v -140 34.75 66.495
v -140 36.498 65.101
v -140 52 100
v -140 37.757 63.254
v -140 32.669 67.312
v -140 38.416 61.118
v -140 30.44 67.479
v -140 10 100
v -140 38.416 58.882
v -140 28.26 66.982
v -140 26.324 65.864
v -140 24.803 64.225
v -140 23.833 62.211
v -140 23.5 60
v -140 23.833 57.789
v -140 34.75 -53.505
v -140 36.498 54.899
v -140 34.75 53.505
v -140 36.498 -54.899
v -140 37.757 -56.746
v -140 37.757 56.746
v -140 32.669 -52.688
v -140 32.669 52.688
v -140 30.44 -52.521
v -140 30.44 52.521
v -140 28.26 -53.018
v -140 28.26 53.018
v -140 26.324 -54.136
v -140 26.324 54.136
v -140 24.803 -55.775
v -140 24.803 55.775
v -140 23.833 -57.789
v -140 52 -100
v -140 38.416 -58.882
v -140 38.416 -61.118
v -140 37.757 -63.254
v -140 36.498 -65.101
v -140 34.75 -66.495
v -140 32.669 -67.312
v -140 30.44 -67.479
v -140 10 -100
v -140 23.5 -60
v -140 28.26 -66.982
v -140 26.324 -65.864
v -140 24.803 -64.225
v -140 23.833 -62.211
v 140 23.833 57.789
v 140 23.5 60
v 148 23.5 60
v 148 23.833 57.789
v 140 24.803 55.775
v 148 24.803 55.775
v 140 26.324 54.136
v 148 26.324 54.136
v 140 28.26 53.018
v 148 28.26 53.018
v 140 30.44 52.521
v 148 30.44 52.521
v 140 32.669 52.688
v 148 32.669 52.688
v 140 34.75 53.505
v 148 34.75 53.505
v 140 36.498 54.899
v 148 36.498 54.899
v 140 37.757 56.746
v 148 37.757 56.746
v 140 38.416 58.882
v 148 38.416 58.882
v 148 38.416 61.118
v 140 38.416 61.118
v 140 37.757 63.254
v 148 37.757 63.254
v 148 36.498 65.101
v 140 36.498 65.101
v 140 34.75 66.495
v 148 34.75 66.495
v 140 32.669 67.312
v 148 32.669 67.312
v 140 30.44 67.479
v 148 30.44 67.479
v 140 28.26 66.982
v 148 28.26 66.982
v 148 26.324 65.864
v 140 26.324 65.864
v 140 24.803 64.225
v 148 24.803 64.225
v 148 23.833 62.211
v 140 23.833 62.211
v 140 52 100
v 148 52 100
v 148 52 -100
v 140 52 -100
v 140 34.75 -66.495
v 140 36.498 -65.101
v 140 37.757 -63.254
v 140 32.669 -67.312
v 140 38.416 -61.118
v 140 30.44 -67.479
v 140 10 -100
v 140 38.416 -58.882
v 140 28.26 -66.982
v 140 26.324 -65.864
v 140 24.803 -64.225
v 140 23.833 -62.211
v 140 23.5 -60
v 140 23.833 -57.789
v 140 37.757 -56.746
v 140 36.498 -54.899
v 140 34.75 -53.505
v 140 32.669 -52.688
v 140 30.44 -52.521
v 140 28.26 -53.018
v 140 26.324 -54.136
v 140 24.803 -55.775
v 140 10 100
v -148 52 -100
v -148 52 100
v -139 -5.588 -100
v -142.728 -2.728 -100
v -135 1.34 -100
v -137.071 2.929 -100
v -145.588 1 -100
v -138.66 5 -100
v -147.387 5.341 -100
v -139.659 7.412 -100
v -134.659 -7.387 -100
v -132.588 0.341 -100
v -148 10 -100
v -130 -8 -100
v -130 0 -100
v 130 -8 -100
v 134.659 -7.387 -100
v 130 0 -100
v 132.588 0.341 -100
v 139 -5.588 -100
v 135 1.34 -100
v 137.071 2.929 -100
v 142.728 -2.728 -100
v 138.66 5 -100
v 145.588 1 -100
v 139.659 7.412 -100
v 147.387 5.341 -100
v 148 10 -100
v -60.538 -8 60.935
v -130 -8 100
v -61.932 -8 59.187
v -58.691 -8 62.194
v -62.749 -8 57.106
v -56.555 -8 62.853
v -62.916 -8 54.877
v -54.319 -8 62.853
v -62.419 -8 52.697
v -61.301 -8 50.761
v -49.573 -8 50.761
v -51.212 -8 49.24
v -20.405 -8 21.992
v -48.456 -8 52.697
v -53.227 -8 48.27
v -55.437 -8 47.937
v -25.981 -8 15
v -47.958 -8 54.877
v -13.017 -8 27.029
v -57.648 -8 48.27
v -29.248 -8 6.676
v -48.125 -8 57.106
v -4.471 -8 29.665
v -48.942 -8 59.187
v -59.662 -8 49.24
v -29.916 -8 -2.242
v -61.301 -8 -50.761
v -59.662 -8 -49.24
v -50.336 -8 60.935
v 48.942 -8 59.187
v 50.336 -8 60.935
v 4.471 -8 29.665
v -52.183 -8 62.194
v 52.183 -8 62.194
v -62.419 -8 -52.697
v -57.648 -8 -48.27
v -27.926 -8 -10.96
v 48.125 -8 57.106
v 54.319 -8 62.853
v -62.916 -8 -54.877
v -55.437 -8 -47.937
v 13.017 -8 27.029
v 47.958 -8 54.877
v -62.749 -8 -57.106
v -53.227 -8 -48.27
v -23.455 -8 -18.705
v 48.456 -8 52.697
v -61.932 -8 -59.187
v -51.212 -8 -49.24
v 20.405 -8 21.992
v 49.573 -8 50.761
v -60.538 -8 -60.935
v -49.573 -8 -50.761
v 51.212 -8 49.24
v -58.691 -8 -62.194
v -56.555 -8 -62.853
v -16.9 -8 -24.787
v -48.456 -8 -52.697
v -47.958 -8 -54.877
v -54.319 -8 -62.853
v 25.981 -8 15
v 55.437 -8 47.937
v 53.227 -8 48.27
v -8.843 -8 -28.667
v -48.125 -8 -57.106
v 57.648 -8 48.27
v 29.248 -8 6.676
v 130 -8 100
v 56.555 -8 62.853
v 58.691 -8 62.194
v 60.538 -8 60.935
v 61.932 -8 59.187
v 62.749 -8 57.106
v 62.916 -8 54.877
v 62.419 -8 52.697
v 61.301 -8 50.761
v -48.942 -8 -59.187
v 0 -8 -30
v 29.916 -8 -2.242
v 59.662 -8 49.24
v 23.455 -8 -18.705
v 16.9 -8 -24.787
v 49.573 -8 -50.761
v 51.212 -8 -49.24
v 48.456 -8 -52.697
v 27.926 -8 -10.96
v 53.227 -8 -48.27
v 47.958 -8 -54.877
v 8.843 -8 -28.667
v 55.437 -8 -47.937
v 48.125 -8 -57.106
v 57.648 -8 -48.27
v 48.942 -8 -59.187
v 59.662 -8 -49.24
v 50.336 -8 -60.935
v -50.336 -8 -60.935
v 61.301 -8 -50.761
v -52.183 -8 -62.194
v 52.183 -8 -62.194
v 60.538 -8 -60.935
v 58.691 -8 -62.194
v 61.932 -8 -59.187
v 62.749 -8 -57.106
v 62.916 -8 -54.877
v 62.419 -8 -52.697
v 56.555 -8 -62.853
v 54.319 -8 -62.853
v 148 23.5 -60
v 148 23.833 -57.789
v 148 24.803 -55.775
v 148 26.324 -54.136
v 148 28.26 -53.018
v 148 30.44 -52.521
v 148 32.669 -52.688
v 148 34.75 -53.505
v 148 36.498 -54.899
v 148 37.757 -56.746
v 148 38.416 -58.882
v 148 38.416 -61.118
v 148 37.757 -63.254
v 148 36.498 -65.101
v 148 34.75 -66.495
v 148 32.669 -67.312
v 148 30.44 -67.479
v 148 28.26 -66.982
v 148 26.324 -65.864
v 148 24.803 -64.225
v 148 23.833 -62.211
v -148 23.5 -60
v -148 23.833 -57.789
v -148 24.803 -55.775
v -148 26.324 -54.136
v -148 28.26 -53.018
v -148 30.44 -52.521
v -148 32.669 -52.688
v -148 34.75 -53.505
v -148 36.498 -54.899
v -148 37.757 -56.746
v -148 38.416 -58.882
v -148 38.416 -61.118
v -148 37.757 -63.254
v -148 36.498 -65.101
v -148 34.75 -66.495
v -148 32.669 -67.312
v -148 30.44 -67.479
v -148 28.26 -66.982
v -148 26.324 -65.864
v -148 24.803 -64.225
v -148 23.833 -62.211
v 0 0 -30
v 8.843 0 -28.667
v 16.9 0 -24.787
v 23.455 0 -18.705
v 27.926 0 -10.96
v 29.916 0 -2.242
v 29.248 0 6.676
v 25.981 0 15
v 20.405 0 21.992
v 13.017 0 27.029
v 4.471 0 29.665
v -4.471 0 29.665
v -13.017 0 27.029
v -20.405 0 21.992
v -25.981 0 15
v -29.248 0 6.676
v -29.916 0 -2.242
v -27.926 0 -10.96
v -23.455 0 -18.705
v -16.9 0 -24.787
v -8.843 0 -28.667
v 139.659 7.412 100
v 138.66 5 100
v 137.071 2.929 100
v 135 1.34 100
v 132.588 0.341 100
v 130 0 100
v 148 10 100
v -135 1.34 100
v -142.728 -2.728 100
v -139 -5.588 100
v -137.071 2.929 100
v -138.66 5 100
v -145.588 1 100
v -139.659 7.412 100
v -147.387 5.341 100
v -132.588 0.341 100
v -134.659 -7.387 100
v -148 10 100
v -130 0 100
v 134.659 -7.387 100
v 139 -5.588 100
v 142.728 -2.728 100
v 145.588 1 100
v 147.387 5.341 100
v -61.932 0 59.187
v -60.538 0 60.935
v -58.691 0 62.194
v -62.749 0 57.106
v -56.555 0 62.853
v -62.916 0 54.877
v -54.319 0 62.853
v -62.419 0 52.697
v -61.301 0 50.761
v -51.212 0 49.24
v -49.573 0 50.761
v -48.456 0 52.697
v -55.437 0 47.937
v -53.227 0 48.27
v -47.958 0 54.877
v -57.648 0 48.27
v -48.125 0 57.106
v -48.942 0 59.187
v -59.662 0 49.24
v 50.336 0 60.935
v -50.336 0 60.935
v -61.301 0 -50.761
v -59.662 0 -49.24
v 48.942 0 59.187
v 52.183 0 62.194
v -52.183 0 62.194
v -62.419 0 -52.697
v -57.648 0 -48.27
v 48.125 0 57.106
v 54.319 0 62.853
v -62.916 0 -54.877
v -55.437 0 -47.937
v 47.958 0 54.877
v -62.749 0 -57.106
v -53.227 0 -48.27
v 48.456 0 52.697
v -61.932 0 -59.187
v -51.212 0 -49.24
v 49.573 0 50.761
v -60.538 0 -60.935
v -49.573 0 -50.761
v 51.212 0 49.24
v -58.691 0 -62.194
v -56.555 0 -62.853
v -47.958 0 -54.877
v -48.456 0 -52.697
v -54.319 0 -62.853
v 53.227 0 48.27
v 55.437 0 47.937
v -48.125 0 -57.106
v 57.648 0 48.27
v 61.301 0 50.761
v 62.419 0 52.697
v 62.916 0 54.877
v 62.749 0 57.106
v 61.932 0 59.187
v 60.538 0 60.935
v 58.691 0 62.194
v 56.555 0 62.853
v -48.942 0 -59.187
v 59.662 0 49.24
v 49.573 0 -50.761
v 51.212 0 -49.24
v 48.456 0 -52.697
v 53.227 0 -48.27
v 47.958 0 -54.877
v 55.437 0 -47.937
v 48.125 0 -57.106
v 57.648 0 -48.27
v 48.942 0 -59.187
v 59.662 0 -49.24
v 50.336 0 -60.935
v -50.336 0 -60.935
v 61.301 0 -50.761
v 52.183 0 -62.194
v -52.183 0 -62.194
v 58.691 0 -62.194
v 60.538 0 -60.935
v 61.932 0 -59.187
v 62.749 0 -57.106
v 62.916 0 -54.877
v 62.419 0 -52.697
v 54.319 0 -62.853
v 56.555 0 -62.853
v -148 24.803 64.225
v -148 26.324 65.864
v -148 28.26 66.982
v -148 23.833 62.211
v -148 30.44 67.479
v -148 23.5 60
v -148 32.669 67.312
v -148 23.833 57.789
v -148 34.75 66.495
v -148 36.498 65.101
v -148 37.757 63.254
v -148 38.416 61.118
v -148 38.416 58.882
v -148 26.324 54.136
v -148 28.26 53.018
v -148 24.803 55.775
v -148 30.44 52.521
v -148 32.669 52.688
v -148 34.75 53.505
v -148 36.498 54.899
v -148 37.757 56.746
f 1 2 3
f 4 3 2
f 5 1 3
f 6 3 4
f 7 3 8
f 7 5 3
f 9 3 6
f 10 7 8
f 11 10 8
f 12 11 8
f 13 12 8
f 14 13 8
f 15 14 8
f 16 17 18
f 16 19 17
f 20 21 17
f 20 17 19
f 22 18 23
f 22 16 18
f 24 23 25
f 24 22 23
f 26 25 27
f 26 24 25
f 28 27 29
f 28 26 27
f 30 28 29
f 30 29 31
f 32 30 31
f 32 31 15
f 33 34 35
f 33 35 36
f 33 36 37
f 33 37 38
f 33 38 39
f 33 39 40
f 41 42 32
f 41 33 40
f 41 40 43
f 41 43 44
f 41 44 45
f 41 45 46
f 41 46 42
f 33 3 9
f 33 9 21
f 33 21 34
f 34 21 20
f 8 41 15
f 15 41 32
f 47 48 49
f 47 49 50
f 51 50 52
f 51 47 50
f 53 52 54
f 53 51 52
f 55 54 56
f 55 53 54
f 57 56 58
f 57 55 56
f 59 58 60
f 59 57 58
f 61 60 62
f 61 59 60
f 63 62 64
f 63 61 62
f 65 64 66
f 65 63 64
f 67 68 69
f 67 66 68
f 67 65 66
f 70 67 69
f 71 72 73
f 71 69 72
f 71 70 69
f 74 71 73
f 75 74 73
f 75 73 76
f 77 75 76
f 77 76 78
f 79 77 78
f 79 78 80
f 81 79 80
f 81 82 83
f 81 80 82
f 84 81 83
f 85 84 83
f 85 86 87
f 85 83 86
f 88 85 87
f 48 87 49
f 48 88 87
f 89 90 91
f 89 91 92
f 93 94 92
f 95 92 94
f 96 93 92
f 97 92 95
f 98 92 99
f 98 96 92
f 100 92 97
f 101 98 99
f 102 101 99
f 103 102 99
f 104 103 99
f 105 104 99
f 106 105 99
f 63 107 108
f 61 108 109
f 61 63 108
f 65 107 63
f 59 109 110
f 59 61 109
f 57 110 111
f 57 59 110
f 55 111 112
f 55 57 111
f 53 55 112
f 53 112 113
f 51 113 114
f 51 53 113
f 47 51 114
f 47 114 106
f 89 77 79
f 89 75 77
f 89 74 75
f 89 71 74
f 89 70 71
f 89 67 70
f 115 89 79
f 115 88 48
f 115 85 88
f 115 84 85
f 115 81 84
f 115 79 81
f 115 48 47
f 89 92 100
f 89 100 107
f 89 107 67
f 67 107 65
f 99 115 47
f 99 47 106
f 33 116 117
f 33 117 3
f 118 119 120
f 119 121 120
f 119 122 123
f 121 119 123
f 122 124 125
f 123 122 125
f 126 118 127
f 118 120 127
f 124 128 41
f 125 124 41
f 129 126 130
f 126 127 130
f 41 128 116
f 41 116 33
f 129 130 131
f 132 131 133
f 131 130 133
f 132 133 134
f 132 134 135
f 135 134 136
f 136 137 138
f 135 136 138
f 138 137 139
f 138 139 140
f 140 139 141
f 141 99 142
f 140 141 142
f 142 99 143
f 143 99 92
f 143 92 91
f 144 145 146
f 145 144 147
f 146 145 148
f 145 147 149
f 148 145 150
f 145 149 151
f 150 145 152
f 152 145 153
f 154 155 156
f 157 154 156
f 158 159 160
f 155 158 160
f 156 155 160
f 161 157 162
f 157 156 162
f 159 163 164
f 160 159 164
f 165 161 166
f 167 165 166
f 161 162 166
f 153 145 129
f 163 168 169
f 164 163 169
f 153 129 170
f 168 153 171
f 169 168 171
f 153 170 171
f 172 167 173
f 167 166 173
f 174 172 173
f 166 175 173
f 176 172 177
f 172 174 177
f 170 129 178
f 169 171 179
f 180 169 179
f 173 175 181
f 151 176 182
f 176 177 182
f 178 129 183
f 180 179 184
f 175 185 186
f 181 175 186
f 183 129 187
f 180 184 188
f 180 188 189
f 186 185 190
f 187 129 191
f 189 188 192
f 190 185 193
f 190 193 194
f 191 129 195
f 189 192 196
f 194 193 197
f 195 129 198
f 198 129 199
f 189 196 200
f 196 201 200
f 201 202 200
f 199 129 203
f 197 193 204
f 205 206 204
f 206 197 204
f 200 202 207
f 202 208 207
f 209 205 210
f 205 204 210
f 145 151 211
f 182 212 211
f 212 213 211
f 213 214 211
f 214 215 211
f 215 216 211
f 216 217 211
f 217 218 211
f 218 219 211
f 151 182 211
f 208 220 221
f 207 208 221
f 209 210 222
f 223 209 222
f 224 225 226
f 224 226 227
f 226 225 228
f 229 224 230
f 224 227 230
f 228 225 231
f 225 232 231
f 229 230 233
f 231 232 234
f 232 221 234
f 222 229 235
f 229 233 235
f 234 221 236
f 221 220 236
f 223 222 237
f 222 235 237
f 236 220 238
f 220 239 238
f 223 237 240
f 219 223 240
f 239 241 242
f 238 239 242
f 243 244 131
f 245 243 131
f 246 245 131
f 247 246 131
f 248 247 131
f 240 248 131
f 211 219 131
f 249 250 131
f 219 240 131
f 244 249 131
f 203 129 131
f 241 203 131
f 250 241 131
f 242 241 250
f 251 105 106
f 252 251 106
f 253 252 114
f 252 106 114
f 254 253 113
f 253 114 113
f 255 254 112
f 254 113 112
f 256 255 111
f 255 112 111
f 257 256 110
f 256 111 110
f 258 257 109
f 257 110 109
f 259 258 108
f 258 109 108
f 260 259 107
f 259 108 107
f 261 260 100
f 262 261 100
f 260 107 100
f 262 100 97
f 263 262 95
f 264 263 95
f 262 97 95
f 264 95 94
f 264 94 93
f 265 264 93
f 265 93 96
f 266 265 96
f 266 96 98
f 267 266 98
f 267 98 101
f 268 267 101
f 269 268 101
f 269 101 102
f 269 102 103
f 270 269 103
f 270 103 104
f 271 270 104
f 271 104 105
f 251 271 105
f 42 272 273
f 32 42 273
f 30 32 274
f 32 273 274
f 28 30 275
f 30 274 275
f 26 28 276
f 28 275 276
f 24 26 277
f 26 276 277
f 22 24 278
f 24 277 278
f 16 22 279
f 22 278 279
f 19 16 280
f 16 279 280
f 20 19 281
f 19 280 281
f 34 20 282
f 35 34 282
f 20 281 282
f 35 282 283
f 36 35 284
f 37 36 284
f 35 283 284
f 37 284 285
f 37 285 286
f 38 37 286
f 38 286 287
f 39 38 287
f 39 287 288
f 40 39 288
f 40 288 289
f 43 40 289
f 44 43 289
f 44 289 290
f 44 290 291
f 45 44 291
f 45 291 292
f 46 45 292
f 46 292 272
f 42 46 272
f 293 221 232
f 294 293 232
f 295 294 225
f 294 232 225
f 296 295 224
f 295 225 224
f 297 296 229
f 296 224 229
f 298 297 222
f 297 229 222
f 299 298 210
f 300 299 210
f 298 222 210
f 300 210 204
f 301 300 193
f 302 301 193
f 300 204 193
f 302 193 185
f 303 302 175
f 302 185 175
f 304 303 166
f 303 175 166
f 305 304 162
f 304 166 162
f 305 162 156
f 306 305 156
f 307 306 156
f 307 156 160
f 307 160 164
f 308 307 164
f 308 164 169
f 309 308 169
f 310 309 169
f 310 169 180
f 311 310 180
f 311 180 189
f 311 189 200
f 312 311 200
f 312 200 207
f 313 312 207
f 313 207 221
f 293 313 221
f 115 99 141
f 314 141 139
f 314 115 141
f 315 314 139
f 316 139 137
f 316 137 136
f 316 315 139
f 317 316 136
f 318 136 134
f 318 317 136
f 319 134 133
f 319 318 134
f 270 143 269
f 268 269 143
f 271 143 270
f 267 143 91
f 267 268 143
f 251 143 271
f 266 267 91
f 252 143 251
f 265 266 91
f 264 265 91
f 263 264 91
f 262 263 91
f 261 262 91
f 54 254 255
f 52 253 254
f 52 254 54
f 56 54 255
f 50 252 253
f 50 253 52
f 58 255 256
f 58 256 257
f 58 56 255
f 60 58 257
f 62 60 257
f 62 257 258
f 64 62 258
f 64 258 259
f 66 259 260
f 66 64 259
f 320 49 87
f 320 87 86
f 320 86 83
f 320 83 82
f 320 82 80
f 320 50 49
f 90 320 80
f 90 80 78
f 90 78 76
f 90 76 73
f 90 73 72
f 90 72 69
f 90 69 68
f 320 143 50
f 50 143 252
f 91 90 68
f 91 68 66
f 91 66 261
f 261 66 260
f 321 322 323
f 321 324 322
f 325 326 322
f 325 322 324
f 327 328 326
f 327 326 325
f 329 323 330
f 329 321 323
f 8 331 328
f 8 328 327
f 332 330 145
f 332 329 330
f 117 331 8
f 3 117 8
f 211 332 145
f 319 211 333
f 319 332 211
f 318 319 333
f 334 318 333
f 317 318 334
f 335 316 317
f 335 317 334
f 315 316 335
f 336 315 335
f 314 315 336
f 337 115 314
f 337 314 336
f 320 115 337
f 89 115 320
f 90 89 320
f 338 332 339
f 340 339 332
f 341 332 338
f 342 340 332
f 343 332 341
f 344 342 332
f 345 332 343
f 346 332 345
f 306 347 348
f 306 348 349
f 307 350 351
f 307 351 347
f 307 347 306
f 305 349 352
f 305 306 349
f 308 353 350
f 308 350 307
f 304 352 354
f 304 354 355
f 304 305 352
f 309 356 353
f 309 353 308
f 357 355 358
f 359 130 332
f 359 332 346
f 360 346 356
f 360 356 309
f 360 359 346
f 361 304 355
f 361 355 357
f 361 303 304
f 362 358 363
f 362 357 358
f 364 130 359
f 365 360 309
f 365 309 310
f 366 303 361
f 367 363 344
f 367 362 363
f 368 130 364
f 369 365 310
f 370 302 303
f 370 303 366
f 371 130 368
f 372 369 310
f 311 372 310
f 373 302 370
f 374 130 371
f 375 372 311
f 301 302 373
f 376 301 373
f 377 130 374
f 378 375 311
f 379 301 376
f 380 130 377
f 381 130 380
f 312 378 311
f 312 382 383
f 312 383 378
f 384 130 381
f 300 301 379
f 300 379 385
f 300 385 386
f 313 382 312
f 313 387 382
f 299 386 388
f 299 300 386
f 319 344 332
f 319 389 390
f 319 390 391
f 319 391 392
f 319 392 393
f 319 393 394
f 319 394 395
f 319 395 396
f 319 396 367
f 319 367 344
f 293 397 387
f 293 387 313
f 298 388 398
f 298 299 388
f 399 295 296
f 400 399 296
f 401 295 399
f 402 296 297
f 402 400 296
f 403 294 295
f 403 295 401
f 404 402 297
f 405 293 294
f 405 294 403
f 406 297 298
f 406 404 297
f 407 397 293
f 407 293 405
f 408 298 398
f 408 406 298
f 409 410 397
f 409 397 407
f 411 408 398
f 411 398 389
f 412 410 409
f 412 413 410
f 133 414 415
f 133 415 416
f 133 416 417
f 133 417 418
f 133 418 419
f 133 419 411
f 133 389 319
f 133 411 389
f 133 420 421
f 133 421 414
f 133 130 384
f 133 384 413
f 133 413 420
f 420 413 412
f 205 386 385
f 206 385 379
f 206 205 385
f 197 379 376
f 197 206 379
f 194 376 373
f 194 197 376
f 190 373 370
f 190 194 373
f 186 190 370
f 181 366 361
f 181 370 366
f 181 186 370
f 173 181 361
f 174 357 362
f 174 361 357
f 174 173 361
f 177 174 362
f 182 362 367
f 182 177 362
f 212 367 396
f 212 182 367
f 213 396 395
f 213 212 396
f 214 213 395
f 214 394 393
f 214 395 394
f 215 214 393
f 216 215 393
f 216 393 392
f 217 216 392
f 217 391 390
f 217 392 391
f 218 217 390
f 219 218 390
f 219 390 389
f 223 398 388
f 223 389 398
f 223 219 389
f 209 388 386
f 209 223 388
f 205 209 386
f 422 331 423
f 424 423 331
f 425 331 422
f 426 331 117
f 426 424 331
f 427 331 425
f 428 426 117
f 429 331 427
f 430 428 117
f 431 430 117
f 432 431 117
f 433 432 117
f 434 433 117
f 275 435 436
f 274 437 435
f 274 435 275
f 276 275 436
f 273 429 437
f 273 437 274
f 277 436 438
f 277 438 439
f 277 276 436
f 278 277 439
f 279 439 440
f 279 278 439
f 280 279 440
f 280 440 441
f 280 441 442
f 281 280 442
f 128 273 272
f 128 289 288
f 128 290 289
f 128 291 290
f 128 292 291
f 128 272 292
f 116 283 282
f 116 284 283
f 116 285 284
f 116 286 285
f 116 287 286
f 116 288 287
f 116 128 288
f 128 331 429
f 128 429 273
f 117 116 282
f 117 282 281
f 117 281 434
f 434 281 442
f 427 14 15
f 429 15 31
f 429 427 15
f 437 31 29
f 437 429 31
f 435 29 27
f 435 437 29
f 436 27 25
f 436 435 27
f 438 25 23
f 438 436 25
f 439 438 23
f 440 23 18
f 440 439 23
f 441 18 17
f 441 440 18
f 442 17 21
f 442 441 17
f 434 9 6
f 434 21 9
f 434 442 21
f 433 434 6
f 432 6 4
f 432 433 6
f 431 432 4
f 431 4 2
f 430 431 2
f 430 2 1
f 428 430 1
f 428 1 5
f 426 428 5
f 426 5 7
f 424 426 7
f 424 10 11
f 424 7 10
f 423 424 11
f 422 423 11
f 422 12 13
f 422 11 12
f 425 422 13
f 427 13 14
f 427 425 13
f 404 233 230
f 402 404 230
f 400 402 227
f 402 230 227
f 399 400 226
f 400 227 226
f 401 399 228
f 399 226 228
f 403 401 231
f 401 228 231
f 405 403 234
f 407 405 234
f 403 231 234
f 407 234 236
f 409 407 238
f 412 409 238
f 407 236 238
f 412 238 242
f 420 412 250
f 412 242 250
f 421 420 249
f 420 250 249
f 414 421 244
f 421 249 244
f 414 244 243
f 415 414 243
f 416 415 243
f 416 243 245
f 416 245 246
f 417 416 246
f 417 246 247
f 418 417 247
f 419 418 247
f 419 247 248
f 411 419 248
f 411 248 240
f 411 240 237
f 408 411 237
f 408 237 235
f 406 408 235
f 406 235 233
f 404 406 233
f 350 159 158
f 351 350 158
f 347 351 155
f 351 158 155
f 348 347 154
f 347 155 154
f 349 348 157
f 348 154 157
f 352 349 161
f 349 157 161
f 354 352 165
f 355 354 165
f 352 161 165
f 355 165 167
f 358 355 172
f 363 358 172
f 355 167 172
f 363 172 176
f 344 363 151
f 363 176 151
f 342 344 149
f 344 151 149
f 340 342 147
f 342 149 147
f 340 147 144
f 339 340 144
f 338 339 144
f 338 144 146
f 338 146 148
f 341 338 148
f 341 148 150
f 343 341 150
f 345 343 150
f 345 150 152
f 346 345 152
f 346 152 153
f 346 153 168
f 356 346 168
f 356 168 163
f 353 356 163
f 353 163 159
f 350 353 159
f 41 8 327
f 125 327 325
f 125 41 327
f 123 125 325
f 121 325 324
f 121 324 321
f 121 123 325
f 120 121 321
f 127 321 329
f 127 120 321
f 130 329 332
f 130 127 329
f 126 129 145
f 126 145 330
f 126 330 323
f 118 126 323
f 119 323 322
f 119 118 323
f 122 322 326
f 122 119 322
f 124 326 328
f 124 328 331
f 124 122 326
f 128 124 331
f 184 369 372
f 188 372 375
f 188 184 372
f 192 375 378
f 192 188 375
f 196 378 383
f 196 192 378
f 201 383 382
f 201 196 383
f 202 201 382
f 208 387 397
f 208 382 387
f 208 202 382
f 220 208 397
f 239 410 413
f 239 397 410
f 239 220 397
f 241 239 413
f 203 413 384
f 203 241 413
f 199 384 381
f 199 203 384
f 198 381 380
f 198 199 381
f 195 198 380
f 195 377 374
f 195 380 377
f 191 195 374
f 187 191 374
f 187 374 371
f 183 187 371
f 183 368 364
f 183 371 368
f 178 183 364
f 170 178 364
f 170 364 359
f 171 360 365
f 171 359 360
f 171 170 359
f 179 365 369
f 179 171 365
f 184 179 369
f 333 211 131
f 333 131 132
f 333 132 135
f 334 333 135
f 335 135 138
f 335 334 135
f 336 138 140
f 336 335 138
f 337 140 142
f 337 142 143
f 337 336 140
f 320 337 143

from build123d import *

# Parameters (mm, degrees)
SKETCH1_W                      = 296
SKETCH1_H                      = 200
BASE_FLANGE1_DEPTH             = 8
EDGE_FLANGE1_STRIP_W           = 52
EDGE_FLANGE1_STRIP_H           = 8
EDGE_FLANGE1_STRIP_CUT_DEPTH   = 200
EDGE_FLANGE1_STRIP_2_W         = 52
EDGE_FLANGE1_STRIP_2_H         = 8
EDGE_FLANGE1_STRIP_CUT_2_DEPTH = 200
EDGE_FLANGE1_DEPTH             = 200
EDGE_FLANGE1_BEND_DEPTH        = 200
SKETCH12_R                     = 30
CUT_EXTRUDE1_DEPTH             = 10
SKETCH13_R                     = 7.5
CUT_EXTRUDE2_DEPTH             = 10
SKETCH15_R                     = 7.5
CUT_EXTRUDE3_DEPTH             = 317.733326317
MIRROR5_COPY_1_SKETCH_R        = 7.5
MIRROR5_COPY_1_DEPTH           = 10


# Sheet-metal steps are written as plain solids
with BuildPart() as part:
    # Sketch1 → Base-Flange1 (new body)
    with BuildSketch(Plane(origin=(0, 0, 0), x_dir=(1, 0, 0), z_dir=(0, 1, 0))):
        Rectangle(SKETCH1_W, SKETCH1_H)
    extrude(amount=-BASE_FLANGE1_DEPTH)

    # Edge-Flange1 strip (across the edge) → Edge-Flange1 strip cut (cut)
    with BuildSketch(Plane(origin=(-148, 0, -100), x_dir=(1, 0, 0), z_dir=(0, 0, 1))):
        with Locations((-8, -4)):
            Rectangle(EDGE_FLANGE1_STRIP_W, EDGE_FLANGE1_STRIP_H)
    extrude(amount=EDGE_FLANGE1_STRIP_CUT_DEPTH, mode=Mode.SUBTRACT)

    # Edge-Flange1 strip 2 (across the edge) → Edge-Flange1 strip cut 2 (cut)
    with BuildSketch(Plane(origin=(148, 0, 100), x_dir=(-1, 0, 0), z_dir=(0, 0, -1))):
        with Locations((-8, -4)):
            Rectangle(EDGE_FLANGE1_STRIP_2_W, EDGE_FLANGE1_STRIP_2_H)
    extrude(amount=EDGE_FLANGE1_STRIP_CUT_2_DEPTH, mode=Mode.SUBTRACT)

    # Edge-Flange1 section (across the edge) → Edge-Flange1 (add)
    with BuildSketch(Plane(origin=(-148, 0, -100), x_dir=(1, 0, 0), z_dir=(0, 0, 1))):
        with BuildLine():
            Line((0, 10), (0, 52))
            Line((0, 52), (8, 52))
            Line((8, 52), (8, 10))
            ThreePointArc((8, 10), (10.928932188, 2.928932188), (18, 0))
            Line((18, 0), (18, -8))
            ThreePointArc((18, -8), (5.272077939, -2.727922061), (0, 10))
        make_face()
    extrude(amount=EDGE_FLANGE1_DEPTH)

    # Edge-Flange1 section 2 (across the edge) → Edge-Flange1 bend (add)
    with BuildSketch(Plane(origin=(148, 0, 100), x_dir=(-1, 0, 0), z_dir=(0, 0, -1))):
        with BuildLine():
            Line((0, 10), (0, 52))
            Line((0, 52), (8, 52))
            Line((8, 52), (8, 10))
            ThreePointArc((8, 10), (10.928932188, 2.928932188), (18, 0))
            Line((18, 0), (18, -8))
            ThreePointArc((18, -8), (5.272077939, -2.727922061), (0, 10))
        make_face()
    extrude(amount=EDGE_FLANGE1_BEND_DEPTH)

    # Sketch12 → Cut-Extrude1 (cut)
    with BuildSketch(Plane(origin=(0, -8, 0), x_dir=(-1, 0, 0), z_dir=(0, -1, 0))):
        with Locations(Location((0, 0, 0), (0, 0, 90))):
            Circle(SKETCH12_R)
    extrude(amount=-CUT_EXTRUDE1_DEPTH, mode=Mode.SUBTRACT)

    # Sketch13 → Cut-Extrude2 (cut)
    with BuildSketch(Plane(origin=(0, -8, 0), x_dir=(-1, 0, 0), z_dir=(0, -1, 0))):
        with Locations(Location((55.437171645, -55.437171645, 0), (0, 0, 90))):
            Circle(SKETCH13_R)
    cut_extrude2 = extrude(amount=-CUT_EXTRUDE2_DEPTH, mode=Mode.SUBTRACT)

    # Mirror4: Cut-Extrude2 across plane
    add(cut_extrude2.mirror(Plane(origin=(0, 0, 0), x_dir=(0, 0, 1), z_dir=(1, 0, 0))), mode=Mode.SUBTRACT)

    # Sketch15 → Cut-Extrude3 (cut, through all)
    with BuildSketch(Plane.ZY.offset(148)):
        with Locations(Location((-60, 31, 0), (0, 0, 270))):
            Circle(SKETCH15_R)
    cut_extrude3 = extrude(amount=-CUT_EXTRUDE3_DEPTH, mode=Mode.SUBTRACT)

    # Mirror5: Cut-Extrude2, Cut-Extrude3 across plane
    add(cut_extrude2.mirror(Plane.XY), mode=Mode.SUBTRACT)
    add(cut_extrude3.mirror(Plane.XY), mode=Mode.SUBTRACT)

    # Mirror5 copy 1 sketch → Mirror5 copy 1 (cut)
    with BuildSketch(Plane.XZ.offset(8)):
        with Locations(Location((55.437171645, -55.437171645, 0), (0, 0, 90))):
            Circle(MIRROR5_COPY_1_SKETCH_R)
    extrude(amount=-MIRROR5_COPY_1_DEPTH, mode=Mode.SUBTRACT)


solid = part.part
